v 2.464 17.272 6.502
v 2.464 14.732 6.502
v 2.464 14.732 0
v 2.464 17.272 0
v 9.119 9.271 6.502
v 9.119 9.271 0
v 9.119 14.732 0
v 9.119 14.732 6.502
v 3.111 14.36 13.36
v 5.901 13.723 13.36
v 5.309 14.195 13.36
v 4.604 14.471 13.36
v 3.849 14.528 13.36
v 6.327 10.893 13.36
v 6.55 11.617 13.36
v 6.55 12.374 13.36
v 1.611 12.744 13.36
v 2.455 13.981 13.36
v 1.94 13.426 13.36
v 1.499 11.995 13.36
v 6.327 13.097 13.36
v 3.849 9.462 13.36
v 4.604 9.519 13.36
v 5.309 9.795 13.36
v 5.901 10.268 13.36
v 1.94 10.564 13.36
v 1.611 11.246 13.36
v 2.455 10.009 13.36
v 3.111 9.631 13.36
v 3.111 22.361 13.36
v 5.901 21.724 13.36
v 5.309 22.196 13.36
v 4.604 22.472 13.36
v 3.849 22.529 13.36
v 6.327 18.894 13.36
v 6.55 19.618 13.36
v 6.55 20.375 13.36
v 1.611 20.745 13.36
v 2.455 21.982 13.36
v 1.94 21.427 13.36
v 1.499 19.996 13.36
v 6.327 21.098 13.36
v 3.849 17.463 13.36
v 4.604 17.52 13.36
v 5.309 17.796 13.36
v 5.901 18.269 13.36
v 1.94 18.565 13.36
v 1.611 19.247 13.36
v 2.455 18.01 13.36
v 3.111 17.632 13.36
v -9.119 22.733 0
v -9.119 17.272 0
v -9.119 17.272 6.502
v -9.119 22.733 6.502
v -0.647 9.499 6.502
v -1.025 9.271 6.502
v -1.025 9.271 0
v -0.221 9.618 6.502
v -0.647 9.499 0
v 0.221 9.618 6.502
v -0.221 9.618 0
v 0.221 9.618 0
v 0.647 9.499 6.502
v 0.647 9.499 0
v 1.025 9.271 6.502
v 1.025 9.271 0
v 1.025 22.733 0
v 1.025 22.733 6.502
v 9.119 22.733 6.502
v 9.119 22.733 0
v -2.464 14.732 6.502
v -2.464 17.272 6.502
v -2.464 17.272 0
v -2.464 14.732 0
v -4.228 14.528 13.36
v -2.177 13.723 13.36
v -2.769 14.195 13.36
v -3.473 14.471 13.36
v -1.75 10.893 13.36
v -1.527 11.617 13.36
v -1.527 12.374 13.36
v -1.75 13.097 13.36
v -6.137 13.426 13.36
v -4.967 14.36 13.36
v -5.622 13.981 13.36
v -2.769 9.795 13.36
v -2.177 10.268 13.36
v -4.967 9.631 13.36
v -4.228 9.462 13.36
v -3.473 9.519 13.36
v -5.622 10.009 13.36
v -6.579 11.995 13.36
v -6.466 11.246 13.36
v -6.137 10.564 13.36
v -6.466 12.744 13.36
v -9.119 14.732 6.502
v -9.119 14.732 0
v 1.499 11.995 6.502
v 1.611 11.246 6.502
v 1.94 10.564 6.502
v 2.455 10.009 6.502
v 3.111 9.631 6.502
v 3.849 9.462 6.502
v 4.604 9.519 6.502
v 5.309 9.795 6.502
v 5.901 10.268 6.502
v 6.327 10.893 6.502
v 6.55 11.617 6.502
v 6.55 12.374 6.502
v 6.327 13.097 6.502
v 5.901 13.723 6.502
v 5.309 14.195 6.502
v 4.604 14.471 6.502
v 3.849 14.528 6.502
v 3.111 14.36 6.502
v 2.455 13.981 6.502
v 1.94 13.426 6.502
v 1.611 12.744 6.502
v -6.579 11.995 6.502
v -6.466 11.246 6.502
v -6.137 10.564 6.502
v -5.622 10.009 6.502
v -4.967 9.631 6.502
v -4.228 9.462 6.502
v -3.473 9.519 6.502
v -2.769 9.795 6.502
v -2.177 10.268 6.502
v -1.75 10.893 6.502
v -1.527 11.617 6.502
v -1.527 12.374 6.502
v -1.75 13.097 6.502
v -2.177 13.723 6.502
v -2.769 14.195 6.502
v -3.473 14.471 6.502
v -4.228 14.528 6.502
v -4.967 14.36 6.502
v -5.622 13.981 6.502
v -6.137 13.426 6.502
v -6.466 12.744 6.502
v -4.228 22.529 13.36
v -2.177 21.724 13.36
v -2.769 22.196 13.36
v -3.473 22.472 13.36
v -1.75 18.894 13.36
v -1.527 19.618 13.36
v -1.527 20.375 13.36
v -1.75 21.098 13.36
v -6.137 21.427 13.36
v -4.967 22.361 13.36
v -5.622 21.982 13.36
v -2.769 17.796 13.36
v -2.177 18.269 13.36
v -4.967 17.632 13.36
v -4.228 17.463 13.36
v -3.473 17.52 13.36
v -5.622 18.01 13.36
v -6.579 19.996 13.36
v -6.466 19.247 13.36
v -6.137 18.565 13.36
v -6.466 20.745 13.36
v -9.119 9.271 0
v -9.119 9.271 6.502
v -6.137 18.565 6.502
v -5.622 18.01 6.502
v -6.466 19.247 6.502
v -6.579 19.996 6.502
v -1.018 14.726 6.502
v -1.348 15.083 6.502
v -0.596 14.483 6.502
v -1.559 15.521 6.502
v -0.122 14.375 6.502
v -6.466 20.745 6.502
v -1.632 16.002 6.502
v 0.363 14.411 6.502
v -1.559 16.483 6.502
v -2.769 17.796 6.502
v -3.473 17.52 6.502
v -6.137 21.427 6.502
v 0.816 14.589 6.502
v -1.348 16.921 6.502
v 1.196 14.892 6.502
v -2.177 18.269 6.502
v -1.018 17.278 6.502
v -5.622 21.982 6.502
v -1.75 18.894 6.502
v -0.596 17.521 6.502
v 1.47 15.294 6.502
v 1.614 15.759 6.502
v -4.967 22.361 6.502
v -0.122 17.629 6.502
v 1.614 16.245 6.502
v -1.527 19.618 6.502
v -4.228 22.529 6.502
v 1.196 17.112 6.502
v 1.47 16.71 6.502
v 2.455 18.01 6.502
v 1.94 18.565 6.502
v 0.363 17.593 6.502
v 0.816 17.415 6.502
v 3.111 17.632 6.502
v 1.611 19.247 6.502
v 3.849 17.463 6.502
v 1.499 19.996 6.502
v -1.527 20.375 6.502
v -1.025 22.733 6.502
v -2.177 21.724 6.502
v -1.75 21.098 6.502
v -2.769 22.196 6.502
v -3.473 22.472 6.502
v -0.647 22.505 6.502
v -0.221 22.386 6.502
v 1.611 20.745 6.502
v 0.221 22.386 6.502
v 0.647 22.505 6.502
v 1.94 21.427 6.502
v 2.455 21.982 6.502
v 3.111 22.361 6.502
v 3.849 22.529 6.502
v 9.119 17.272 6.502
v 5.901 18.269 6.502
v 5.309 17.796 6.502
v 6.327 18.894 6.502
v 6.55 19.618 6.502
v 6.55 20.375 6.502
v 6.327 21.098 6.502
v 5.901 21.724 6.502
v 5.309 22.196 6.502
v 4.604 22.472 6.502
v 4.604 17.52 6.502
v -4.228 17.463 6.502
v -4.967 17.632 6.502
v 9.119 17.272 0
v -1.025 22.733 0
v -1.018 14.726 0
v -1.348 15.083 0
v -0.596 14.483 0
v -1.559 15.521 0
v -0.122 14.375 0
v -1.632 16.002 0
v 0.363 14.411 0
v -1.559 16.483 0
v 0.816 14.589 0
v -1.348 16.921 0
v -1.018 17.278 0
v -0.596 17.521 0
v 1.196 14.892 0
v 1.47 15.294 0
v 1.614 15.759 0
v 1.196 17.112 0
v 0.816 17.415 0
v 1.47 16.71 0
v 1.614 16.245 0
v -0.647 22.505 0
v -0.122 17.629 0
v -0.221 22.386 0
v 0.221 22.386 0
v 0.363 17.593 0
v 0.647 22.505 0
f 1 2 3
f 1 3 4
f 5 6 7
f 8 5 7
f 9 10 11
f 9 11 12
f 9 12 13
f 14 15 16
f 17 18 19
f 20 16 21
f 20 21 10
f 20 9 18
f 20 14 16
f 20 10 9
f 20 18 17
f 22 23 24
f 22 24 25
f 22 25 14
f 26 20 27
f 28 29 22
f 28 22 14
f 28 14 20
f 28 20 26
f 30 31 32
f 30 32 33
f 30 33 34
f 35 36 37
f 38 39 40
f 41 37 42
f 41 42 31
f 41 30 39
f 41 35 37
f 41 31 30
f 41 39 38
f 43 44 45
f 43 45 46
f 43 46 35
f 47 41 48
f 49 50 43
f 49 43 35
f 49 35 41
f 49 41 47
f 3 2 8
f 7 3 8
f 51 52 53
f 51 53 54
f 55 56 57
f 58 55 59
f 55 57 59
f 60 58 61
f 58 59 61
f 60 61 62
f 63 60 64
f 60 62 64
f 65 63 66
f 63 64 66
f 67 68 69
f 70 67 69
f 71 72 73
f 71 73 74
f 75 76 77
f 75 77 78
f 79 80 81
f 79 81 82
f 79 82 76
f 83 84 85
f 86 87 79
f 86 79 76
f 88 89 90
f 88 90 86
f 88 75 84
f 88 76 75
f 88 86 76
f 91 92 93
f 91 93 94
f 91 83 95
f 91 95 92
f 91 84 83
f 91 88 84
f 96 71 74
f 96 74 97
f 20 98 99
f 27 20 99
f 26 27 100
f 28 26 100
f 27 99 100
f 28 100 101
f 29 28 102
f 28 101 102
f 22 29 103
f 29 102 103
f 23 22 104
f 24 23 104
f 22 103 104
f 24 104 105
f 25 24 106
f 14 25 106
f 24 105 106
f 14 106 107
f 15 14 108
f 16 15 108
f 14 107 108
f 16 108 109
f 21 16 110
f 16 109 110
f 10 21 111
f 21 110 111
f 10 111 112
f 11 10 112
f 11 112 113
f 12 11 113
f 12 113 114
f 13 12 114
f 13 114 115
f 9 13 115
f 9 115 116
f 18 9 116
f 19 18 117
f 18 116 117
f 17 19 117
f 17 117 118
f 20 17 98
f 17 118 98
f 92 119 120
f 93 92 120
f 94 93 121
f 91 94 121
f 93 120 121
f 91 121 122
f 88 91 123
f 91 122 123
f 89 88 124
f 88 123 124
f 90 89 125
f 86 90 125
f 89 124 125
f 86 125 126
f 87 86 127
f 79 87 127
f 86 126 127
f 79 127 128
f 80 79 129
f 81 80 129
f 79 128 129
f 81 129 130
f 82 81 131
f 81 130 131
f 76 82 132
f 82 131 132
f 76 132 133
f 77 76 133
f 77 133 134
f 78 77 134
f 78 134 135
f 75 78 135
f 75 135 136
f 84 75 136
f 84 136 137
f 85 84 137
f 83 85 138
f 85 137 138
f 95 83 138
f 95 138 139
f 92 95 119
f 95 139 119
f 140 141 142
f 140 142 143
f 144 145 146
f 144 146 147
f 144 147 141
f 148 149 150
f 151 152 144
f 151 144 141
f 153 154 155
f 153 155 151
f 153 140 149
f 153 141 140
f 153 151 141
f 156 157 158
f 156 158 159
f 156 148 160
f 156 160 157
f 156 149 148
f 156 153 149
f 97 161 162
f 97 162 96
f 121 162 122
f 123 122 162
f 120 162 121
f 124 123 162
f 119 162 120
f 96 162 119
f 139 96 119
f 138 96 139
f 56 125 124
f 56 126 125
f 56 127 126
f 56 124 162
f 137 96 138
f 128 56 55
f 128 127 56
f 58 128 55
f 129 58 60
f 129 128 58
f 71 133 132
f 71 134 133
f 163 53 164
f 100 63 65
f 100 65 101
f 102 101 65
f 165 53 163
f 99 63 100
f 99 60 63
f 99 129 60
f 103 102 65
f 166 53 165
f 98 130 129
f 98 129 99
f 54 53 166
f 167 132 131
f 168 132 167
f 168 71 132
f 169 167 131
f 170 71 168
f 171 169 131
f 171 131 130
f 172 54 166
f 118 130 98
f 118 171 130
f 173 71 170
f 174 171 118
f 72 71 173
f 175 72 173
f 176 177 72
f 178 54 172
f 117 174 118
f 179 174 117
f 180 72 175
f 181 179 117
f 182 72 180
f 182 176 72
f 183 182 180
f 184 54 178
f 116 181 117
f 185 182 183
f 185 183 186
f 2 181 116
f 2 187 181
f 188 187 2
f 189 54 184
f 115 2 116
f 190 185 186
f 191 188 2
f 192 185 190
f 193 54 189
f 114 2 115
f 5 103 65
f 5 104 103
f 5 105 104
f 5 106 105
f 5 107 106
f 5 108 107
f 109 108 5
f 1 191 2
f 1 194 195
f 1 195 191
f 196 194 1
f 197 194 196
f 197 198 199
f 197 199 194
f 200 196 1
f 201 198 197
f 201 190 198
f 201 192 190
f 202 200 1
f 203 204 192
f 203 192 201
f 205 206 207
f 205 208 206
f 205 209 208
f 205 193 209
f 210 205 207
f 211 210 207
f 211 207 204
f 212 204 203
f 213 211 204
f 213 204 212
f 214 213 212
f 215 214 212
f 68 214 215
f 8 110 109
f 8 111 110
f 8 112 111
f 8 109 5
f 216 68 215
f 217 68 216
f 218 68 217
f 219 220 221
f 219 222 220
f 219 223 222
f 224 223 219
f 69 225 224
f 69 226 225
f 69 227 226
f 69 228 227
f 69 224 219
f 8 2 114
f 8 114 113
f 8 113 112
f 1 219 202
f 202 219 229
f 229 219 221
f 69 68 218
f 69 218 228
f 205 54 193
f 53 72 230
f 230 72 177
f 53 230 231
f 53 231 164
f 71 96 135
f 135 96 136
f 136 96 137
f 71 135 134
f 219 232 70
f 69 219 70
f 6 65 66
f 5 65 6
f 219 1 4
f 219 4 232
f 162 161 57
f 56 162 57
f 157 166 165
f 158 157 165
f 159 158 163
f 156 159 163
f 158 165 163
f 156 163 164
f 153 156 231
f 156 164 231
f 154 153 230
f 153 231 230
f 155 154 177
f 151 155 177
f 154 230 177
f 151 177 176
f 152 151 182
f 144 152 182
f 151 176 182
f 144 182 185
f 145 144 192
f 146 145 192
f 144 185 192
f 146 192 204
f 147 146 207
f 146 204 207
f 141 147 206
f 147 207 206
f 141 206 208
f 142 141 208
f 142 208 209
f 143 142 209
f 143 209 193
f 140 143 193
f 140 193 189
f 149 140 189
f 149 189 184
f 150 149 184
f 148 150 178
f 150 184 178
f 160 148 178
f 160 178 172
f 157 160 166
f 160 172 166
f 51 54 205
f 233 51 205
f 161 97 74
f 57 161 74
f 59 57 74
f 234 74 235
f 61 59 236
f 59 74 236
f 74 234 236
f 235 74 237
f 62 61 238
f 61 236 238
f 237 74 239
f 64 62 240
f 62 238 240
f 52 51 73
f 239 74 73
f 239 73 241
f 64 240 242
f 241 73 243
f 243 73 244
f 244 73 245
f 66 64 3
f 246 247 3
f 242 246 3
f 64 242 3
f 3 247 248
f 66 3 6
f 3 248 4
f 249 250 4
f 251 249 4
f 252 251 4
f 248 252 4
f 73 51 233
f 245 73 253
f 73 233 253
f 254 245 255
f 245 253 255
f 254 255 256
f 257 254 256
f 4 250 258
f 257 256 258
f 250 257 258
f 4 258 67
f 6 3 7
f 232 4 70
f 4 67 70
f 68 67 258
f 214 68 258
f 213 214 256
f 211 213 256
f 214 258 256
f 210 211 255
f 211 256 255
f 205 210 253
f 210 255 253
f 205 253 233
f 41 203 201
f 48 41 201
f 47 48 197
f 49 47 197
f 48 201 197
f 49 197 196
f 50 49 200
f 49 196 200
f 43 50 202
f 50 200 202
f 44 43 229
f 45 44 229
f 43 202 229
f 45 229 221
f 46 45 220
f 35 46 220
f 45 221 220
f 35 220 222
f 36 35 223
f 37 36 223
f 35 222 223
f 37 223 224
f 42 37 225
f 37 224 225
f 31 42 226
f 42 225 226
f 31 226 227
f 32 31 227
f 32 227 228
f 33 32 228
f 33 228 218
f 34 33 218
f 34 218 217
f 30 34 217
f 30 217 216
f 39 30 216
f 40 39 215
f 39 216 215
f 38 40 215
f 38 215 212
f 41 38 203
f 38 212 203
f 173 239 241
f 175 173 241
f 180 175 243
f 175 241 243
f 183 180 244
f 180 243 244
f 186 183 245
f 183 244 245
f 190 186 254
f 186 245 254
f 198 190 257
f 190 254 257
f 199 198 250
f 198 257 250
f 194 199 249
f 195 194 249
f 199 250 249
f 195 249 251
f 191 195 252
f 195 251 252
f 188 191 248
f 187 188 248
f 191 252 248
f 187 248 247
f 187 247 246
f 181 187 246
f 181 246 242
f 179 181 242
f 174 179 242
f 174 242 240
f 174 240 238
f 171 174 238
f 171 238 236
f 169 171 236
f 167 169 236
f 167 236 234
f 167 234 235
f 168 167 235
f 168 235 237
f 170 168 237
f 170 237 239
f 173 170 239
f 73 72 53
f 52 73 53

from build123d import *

# Parameters (mm, degrees)
SKETCH1_W                 = 18.2372
SKETCH1_H                 = 13.4874
BOSS_EXTRUDE1_DEPTH       = 6.5024
SKETCH2_W                 = 6.6548
SKETCH2_H                 = 2.54
CUT_EXTRUDE1_DEPTH        = 14.073161875
SKETCH5_R                 = 2.54
BOSS_EXTRUDE2_DEPTH       = 6.858
SKETCH6_W                 = 18.2372
SKETCH6_H                 = 5.4737
CUT_EXTRUDE2_DEPTH        = 14.253622888
F_4_CLEARANCE_HOLE1_D     = 3.2639
LPATTERN1_COUNT           = 4
LPATTERN1_PITCH           = 8.001
LPATTERN1_COPY_1_SKETCH_W = 6.6548
LPATTERN1_COPY_1_SKETCH_H = 2.54
LPATTERN1_COPY_1_DEPTH    = 14.073161875
LPATTERN1_COPY_2_SKETCH_W = 6.6548
LPATTERN1_COPY_2_SKETCH_H = 2.54
LPATTERN1_COPY_2_DEPTH    = 14.073161875
LPATTERN1_COPY_3_SKETCH_W = 6.6548
LPATTERN1_COPY_3_SKETCH_H = 2.54
LPATTERN1_COPY_3_DEPTH    = 14.073161875
LPATTERN1_COPY_4_SKETCH_R = 2.54
LPATTERN1_COPY_4_DEPTH    = 6.858
LPATTERN1_COPY_5_SKETCH_R = 2.54
LPATTERN1_COPY_5_DEPTH    = 6.858
LPATTERN1_COPY_6_SKETCH_R = 2.54
LPATTERN1_COPY_6_DEPTH    = 6.858
SKETCH7_W                 = 18.2372
SKETCH7_H                 = 8.0137
CUT_EXTRUDE3_DEPTH        = 33.795435519
SKETCH8_W                 = 18.2372
SKETCH8_H                 = 16.0147
CUT_EXTRUDE5_DEPTH        = 28.900509729


with BuildPart() as part:
    # Sketch1 → Boss-Extrude1 (new body)
    with BuildSketch(Plane.XY):
        Rectangle(SKETCH1_W, SKETCH1_H)
    boss_extrude1 = extrude(amount=BOSS_EXTRUDE1_DEPTH)

    # Sketch2 → Cut-Extrude1 (cut, through all)
    with BuildSketch(Plane.XY.offset(6.5024)):
        with Locations((5.7912, 0)):
            Rectangle(SKETCH2_W, SKETCH2_H)
    cut_extrude1 = extrude(amount=-CUT_EXTRUDE1_DEPTH, mode=Mode.SUBTRACT)

    # Sketch5 → Boss-Extrude2 (add)
    with BuildSketch(Plane.XY.offset(6.5024)):
        with Locations(Location((4.0386, -4.00685, 0), (0, 0, 180))):
            Circle(SKETCH5_R)
    boss_extrude2 = extrude(amount=BOSS_EXTRUDE2_DEPTH)

    # Sketch6 → Cut-Extrude2 (cut, through all)
    with BuildSketch(Plane.XY.offset(6.5024)):
        with Locations((0, 4.00685)):
            Rectangle(SKETCH6_W, SKETCH6_H)
    extrude(amount=-CUT_EXTRUDE2_DEPTH, mode=Mode.SUBTRACT)

    # #4 Clearance Hole1 (through all)
    with Locations(Plane.XY.offset(6.5024)):
        with Locations((0, 0)):
            f_4_clearance_hole1 = Hole(F_4_CLEARANCE_HOLE1_D / 2)

    # Mirror4: Cut-Extrude1, Boss-Extrude2 across plane
    add(cut_extrude1.mirror(Plane(origin=(0, 0, 0), x_dir=(0, 0, 1), z_dir=(1, 0, 0))), mode=Mode.SUBTRACT)
    add(boss_extrude2.mirror(Plane(origin=(0, 0, 0), x_dir=(0, 0, 1), z_dir=(1, 0, 0))))

    # LPattern1: Boss-Extrude1, Cut-Extrude1, Boss-Extrude2, #4 Clearance Hole1 ×4
    with Locations(*[(0, i * LPATTERN1_PITCH, 0) for i in range(1, LPATTERN1_COUNT)]):
        add(boss_extrude1)
        add(cut_extrude1, mode=Mode.SUBTRACT)
        add(boss_extrude2)
        add(f_4_clearance_hole1, mode=Mode.SUBTRACT)

    # LPattern1 copy 1 sketch → LPattern1 copy 1 (cut, through all)
    with BuildSketch(Plane(origin=(0, 8.001, 6.5024), x_dir=(-1, 0, 0), z_dir=(0, 0, 1))):
        with Locations((5.7912, 0)):
            Rectangle(LPATTERN1_COPY_1_SKETCH_W, LPATTERN1_COPY_1_SKETCH_H)
    extrude(amount=-LPATTERN1_COPY_1_DEPTH, mode=Mode.SUBTRACT)

    # LPattern1 copy 2 sketch → LPattern1 copy 2 (cut, through all)
    with BuildSketch(Plane(origin=(0, 16.002, 6.5024), x_dir=(-1, 0, 0), z_dir=(0, 0, 1))):
        with Locations((5.7912, 0)):
            Rectangle(LPATTERN1_COPY_2_SKETCH_W, LPATTERN1_COPY_2_SKETCH_H)
    extrude(amount=-LPATTERN1_COPY_2_DEPTH, mode=Mode.SUBTRACT)

    # LPattern1 copy 3 sketch → LPattern1 copy 3 (cut, through all)
    with BuildSketch(Plane(origin=(0, 24.003, 6.5024), x_dir=(-1, 0, 0), z_dir=(0, 0, 1))):
        with Locations((5.7912, 0)):
            Rectangle(LPATTERN1_COPY_3_SKETCH_W, LPATTERN1_COPY_3_SKETCH_H)
    extrude(amount=-LPATTERN1_COPY_3_DEPTH, mode=Mode.SUBTRACT)

    # LPattern1 copy 4 sketch → LPattern1 copy 4 (add)
    with BuildSketch(Plane(origin=(0, 8.001, 6.5024), x_dir=(-1, 0, 0), z_dir=(0, 0, 1))):
        with Locations((4.0386, 4.00685)):
            Circle(LPATTERN1_COPY_4_SKETCH_R)
    extrude(amount=LPATTERN1_COPY_4_DEPTH)

    # LPattern1 copy 5 sketch → LPattern1 copy 5 (add)
    with BuildSketch(Plane(origin=(0, 16.002, 6.5024), x_dir=(-1, 0, 0), z_dir=(0, 0, 1))):
        with Locations((4.0386, 4.00685)):
            Circle(LPATTERN1_COPY_5_SKETCH_R)
    extrude(amount=LPATTERN1_COPY_5_DEPTH)

    # LPattern1 copy 6 sketch → LPattern1 copy 6 (add)
    with BuildSketch(Plane(origin=(0, 24.003, 6.5024), x_dir=(-1, 0, 0), z_dir=(0, 0, 1))):
        with Locations((4.0386, 4.00685)):
            Circle(LPATTERN1_COPY_6_SKETCH_R)
    extrude(amount=LPATTERN1_COPY_6_DEPTH)

    # Sketch7 → Cut-Extrude3 (cut, through all)
    with BuildSketch(Plane.XY.offset(6.5024)):
        with Locations((0, 26.73985)):
            Rectangle(SKETCH7_W, SKETCH7_H)
    extrude(amount=-CUT_EXTRUDE3_DEPTH, mode=Mode.SUBTRACT)

    # Sketch8 → Cut-Extrude5 (cut, through all)
    with BuildSketch(Plane.XY):
        with Locations((0, 1.26365)):
            Rectangle(SKETCH8_W, SKETCH8_H)
    extrude(amount=CUT_EXTRUDE5_DEPTH, mode=Mode.SUBTRACT)


solid = part.part
